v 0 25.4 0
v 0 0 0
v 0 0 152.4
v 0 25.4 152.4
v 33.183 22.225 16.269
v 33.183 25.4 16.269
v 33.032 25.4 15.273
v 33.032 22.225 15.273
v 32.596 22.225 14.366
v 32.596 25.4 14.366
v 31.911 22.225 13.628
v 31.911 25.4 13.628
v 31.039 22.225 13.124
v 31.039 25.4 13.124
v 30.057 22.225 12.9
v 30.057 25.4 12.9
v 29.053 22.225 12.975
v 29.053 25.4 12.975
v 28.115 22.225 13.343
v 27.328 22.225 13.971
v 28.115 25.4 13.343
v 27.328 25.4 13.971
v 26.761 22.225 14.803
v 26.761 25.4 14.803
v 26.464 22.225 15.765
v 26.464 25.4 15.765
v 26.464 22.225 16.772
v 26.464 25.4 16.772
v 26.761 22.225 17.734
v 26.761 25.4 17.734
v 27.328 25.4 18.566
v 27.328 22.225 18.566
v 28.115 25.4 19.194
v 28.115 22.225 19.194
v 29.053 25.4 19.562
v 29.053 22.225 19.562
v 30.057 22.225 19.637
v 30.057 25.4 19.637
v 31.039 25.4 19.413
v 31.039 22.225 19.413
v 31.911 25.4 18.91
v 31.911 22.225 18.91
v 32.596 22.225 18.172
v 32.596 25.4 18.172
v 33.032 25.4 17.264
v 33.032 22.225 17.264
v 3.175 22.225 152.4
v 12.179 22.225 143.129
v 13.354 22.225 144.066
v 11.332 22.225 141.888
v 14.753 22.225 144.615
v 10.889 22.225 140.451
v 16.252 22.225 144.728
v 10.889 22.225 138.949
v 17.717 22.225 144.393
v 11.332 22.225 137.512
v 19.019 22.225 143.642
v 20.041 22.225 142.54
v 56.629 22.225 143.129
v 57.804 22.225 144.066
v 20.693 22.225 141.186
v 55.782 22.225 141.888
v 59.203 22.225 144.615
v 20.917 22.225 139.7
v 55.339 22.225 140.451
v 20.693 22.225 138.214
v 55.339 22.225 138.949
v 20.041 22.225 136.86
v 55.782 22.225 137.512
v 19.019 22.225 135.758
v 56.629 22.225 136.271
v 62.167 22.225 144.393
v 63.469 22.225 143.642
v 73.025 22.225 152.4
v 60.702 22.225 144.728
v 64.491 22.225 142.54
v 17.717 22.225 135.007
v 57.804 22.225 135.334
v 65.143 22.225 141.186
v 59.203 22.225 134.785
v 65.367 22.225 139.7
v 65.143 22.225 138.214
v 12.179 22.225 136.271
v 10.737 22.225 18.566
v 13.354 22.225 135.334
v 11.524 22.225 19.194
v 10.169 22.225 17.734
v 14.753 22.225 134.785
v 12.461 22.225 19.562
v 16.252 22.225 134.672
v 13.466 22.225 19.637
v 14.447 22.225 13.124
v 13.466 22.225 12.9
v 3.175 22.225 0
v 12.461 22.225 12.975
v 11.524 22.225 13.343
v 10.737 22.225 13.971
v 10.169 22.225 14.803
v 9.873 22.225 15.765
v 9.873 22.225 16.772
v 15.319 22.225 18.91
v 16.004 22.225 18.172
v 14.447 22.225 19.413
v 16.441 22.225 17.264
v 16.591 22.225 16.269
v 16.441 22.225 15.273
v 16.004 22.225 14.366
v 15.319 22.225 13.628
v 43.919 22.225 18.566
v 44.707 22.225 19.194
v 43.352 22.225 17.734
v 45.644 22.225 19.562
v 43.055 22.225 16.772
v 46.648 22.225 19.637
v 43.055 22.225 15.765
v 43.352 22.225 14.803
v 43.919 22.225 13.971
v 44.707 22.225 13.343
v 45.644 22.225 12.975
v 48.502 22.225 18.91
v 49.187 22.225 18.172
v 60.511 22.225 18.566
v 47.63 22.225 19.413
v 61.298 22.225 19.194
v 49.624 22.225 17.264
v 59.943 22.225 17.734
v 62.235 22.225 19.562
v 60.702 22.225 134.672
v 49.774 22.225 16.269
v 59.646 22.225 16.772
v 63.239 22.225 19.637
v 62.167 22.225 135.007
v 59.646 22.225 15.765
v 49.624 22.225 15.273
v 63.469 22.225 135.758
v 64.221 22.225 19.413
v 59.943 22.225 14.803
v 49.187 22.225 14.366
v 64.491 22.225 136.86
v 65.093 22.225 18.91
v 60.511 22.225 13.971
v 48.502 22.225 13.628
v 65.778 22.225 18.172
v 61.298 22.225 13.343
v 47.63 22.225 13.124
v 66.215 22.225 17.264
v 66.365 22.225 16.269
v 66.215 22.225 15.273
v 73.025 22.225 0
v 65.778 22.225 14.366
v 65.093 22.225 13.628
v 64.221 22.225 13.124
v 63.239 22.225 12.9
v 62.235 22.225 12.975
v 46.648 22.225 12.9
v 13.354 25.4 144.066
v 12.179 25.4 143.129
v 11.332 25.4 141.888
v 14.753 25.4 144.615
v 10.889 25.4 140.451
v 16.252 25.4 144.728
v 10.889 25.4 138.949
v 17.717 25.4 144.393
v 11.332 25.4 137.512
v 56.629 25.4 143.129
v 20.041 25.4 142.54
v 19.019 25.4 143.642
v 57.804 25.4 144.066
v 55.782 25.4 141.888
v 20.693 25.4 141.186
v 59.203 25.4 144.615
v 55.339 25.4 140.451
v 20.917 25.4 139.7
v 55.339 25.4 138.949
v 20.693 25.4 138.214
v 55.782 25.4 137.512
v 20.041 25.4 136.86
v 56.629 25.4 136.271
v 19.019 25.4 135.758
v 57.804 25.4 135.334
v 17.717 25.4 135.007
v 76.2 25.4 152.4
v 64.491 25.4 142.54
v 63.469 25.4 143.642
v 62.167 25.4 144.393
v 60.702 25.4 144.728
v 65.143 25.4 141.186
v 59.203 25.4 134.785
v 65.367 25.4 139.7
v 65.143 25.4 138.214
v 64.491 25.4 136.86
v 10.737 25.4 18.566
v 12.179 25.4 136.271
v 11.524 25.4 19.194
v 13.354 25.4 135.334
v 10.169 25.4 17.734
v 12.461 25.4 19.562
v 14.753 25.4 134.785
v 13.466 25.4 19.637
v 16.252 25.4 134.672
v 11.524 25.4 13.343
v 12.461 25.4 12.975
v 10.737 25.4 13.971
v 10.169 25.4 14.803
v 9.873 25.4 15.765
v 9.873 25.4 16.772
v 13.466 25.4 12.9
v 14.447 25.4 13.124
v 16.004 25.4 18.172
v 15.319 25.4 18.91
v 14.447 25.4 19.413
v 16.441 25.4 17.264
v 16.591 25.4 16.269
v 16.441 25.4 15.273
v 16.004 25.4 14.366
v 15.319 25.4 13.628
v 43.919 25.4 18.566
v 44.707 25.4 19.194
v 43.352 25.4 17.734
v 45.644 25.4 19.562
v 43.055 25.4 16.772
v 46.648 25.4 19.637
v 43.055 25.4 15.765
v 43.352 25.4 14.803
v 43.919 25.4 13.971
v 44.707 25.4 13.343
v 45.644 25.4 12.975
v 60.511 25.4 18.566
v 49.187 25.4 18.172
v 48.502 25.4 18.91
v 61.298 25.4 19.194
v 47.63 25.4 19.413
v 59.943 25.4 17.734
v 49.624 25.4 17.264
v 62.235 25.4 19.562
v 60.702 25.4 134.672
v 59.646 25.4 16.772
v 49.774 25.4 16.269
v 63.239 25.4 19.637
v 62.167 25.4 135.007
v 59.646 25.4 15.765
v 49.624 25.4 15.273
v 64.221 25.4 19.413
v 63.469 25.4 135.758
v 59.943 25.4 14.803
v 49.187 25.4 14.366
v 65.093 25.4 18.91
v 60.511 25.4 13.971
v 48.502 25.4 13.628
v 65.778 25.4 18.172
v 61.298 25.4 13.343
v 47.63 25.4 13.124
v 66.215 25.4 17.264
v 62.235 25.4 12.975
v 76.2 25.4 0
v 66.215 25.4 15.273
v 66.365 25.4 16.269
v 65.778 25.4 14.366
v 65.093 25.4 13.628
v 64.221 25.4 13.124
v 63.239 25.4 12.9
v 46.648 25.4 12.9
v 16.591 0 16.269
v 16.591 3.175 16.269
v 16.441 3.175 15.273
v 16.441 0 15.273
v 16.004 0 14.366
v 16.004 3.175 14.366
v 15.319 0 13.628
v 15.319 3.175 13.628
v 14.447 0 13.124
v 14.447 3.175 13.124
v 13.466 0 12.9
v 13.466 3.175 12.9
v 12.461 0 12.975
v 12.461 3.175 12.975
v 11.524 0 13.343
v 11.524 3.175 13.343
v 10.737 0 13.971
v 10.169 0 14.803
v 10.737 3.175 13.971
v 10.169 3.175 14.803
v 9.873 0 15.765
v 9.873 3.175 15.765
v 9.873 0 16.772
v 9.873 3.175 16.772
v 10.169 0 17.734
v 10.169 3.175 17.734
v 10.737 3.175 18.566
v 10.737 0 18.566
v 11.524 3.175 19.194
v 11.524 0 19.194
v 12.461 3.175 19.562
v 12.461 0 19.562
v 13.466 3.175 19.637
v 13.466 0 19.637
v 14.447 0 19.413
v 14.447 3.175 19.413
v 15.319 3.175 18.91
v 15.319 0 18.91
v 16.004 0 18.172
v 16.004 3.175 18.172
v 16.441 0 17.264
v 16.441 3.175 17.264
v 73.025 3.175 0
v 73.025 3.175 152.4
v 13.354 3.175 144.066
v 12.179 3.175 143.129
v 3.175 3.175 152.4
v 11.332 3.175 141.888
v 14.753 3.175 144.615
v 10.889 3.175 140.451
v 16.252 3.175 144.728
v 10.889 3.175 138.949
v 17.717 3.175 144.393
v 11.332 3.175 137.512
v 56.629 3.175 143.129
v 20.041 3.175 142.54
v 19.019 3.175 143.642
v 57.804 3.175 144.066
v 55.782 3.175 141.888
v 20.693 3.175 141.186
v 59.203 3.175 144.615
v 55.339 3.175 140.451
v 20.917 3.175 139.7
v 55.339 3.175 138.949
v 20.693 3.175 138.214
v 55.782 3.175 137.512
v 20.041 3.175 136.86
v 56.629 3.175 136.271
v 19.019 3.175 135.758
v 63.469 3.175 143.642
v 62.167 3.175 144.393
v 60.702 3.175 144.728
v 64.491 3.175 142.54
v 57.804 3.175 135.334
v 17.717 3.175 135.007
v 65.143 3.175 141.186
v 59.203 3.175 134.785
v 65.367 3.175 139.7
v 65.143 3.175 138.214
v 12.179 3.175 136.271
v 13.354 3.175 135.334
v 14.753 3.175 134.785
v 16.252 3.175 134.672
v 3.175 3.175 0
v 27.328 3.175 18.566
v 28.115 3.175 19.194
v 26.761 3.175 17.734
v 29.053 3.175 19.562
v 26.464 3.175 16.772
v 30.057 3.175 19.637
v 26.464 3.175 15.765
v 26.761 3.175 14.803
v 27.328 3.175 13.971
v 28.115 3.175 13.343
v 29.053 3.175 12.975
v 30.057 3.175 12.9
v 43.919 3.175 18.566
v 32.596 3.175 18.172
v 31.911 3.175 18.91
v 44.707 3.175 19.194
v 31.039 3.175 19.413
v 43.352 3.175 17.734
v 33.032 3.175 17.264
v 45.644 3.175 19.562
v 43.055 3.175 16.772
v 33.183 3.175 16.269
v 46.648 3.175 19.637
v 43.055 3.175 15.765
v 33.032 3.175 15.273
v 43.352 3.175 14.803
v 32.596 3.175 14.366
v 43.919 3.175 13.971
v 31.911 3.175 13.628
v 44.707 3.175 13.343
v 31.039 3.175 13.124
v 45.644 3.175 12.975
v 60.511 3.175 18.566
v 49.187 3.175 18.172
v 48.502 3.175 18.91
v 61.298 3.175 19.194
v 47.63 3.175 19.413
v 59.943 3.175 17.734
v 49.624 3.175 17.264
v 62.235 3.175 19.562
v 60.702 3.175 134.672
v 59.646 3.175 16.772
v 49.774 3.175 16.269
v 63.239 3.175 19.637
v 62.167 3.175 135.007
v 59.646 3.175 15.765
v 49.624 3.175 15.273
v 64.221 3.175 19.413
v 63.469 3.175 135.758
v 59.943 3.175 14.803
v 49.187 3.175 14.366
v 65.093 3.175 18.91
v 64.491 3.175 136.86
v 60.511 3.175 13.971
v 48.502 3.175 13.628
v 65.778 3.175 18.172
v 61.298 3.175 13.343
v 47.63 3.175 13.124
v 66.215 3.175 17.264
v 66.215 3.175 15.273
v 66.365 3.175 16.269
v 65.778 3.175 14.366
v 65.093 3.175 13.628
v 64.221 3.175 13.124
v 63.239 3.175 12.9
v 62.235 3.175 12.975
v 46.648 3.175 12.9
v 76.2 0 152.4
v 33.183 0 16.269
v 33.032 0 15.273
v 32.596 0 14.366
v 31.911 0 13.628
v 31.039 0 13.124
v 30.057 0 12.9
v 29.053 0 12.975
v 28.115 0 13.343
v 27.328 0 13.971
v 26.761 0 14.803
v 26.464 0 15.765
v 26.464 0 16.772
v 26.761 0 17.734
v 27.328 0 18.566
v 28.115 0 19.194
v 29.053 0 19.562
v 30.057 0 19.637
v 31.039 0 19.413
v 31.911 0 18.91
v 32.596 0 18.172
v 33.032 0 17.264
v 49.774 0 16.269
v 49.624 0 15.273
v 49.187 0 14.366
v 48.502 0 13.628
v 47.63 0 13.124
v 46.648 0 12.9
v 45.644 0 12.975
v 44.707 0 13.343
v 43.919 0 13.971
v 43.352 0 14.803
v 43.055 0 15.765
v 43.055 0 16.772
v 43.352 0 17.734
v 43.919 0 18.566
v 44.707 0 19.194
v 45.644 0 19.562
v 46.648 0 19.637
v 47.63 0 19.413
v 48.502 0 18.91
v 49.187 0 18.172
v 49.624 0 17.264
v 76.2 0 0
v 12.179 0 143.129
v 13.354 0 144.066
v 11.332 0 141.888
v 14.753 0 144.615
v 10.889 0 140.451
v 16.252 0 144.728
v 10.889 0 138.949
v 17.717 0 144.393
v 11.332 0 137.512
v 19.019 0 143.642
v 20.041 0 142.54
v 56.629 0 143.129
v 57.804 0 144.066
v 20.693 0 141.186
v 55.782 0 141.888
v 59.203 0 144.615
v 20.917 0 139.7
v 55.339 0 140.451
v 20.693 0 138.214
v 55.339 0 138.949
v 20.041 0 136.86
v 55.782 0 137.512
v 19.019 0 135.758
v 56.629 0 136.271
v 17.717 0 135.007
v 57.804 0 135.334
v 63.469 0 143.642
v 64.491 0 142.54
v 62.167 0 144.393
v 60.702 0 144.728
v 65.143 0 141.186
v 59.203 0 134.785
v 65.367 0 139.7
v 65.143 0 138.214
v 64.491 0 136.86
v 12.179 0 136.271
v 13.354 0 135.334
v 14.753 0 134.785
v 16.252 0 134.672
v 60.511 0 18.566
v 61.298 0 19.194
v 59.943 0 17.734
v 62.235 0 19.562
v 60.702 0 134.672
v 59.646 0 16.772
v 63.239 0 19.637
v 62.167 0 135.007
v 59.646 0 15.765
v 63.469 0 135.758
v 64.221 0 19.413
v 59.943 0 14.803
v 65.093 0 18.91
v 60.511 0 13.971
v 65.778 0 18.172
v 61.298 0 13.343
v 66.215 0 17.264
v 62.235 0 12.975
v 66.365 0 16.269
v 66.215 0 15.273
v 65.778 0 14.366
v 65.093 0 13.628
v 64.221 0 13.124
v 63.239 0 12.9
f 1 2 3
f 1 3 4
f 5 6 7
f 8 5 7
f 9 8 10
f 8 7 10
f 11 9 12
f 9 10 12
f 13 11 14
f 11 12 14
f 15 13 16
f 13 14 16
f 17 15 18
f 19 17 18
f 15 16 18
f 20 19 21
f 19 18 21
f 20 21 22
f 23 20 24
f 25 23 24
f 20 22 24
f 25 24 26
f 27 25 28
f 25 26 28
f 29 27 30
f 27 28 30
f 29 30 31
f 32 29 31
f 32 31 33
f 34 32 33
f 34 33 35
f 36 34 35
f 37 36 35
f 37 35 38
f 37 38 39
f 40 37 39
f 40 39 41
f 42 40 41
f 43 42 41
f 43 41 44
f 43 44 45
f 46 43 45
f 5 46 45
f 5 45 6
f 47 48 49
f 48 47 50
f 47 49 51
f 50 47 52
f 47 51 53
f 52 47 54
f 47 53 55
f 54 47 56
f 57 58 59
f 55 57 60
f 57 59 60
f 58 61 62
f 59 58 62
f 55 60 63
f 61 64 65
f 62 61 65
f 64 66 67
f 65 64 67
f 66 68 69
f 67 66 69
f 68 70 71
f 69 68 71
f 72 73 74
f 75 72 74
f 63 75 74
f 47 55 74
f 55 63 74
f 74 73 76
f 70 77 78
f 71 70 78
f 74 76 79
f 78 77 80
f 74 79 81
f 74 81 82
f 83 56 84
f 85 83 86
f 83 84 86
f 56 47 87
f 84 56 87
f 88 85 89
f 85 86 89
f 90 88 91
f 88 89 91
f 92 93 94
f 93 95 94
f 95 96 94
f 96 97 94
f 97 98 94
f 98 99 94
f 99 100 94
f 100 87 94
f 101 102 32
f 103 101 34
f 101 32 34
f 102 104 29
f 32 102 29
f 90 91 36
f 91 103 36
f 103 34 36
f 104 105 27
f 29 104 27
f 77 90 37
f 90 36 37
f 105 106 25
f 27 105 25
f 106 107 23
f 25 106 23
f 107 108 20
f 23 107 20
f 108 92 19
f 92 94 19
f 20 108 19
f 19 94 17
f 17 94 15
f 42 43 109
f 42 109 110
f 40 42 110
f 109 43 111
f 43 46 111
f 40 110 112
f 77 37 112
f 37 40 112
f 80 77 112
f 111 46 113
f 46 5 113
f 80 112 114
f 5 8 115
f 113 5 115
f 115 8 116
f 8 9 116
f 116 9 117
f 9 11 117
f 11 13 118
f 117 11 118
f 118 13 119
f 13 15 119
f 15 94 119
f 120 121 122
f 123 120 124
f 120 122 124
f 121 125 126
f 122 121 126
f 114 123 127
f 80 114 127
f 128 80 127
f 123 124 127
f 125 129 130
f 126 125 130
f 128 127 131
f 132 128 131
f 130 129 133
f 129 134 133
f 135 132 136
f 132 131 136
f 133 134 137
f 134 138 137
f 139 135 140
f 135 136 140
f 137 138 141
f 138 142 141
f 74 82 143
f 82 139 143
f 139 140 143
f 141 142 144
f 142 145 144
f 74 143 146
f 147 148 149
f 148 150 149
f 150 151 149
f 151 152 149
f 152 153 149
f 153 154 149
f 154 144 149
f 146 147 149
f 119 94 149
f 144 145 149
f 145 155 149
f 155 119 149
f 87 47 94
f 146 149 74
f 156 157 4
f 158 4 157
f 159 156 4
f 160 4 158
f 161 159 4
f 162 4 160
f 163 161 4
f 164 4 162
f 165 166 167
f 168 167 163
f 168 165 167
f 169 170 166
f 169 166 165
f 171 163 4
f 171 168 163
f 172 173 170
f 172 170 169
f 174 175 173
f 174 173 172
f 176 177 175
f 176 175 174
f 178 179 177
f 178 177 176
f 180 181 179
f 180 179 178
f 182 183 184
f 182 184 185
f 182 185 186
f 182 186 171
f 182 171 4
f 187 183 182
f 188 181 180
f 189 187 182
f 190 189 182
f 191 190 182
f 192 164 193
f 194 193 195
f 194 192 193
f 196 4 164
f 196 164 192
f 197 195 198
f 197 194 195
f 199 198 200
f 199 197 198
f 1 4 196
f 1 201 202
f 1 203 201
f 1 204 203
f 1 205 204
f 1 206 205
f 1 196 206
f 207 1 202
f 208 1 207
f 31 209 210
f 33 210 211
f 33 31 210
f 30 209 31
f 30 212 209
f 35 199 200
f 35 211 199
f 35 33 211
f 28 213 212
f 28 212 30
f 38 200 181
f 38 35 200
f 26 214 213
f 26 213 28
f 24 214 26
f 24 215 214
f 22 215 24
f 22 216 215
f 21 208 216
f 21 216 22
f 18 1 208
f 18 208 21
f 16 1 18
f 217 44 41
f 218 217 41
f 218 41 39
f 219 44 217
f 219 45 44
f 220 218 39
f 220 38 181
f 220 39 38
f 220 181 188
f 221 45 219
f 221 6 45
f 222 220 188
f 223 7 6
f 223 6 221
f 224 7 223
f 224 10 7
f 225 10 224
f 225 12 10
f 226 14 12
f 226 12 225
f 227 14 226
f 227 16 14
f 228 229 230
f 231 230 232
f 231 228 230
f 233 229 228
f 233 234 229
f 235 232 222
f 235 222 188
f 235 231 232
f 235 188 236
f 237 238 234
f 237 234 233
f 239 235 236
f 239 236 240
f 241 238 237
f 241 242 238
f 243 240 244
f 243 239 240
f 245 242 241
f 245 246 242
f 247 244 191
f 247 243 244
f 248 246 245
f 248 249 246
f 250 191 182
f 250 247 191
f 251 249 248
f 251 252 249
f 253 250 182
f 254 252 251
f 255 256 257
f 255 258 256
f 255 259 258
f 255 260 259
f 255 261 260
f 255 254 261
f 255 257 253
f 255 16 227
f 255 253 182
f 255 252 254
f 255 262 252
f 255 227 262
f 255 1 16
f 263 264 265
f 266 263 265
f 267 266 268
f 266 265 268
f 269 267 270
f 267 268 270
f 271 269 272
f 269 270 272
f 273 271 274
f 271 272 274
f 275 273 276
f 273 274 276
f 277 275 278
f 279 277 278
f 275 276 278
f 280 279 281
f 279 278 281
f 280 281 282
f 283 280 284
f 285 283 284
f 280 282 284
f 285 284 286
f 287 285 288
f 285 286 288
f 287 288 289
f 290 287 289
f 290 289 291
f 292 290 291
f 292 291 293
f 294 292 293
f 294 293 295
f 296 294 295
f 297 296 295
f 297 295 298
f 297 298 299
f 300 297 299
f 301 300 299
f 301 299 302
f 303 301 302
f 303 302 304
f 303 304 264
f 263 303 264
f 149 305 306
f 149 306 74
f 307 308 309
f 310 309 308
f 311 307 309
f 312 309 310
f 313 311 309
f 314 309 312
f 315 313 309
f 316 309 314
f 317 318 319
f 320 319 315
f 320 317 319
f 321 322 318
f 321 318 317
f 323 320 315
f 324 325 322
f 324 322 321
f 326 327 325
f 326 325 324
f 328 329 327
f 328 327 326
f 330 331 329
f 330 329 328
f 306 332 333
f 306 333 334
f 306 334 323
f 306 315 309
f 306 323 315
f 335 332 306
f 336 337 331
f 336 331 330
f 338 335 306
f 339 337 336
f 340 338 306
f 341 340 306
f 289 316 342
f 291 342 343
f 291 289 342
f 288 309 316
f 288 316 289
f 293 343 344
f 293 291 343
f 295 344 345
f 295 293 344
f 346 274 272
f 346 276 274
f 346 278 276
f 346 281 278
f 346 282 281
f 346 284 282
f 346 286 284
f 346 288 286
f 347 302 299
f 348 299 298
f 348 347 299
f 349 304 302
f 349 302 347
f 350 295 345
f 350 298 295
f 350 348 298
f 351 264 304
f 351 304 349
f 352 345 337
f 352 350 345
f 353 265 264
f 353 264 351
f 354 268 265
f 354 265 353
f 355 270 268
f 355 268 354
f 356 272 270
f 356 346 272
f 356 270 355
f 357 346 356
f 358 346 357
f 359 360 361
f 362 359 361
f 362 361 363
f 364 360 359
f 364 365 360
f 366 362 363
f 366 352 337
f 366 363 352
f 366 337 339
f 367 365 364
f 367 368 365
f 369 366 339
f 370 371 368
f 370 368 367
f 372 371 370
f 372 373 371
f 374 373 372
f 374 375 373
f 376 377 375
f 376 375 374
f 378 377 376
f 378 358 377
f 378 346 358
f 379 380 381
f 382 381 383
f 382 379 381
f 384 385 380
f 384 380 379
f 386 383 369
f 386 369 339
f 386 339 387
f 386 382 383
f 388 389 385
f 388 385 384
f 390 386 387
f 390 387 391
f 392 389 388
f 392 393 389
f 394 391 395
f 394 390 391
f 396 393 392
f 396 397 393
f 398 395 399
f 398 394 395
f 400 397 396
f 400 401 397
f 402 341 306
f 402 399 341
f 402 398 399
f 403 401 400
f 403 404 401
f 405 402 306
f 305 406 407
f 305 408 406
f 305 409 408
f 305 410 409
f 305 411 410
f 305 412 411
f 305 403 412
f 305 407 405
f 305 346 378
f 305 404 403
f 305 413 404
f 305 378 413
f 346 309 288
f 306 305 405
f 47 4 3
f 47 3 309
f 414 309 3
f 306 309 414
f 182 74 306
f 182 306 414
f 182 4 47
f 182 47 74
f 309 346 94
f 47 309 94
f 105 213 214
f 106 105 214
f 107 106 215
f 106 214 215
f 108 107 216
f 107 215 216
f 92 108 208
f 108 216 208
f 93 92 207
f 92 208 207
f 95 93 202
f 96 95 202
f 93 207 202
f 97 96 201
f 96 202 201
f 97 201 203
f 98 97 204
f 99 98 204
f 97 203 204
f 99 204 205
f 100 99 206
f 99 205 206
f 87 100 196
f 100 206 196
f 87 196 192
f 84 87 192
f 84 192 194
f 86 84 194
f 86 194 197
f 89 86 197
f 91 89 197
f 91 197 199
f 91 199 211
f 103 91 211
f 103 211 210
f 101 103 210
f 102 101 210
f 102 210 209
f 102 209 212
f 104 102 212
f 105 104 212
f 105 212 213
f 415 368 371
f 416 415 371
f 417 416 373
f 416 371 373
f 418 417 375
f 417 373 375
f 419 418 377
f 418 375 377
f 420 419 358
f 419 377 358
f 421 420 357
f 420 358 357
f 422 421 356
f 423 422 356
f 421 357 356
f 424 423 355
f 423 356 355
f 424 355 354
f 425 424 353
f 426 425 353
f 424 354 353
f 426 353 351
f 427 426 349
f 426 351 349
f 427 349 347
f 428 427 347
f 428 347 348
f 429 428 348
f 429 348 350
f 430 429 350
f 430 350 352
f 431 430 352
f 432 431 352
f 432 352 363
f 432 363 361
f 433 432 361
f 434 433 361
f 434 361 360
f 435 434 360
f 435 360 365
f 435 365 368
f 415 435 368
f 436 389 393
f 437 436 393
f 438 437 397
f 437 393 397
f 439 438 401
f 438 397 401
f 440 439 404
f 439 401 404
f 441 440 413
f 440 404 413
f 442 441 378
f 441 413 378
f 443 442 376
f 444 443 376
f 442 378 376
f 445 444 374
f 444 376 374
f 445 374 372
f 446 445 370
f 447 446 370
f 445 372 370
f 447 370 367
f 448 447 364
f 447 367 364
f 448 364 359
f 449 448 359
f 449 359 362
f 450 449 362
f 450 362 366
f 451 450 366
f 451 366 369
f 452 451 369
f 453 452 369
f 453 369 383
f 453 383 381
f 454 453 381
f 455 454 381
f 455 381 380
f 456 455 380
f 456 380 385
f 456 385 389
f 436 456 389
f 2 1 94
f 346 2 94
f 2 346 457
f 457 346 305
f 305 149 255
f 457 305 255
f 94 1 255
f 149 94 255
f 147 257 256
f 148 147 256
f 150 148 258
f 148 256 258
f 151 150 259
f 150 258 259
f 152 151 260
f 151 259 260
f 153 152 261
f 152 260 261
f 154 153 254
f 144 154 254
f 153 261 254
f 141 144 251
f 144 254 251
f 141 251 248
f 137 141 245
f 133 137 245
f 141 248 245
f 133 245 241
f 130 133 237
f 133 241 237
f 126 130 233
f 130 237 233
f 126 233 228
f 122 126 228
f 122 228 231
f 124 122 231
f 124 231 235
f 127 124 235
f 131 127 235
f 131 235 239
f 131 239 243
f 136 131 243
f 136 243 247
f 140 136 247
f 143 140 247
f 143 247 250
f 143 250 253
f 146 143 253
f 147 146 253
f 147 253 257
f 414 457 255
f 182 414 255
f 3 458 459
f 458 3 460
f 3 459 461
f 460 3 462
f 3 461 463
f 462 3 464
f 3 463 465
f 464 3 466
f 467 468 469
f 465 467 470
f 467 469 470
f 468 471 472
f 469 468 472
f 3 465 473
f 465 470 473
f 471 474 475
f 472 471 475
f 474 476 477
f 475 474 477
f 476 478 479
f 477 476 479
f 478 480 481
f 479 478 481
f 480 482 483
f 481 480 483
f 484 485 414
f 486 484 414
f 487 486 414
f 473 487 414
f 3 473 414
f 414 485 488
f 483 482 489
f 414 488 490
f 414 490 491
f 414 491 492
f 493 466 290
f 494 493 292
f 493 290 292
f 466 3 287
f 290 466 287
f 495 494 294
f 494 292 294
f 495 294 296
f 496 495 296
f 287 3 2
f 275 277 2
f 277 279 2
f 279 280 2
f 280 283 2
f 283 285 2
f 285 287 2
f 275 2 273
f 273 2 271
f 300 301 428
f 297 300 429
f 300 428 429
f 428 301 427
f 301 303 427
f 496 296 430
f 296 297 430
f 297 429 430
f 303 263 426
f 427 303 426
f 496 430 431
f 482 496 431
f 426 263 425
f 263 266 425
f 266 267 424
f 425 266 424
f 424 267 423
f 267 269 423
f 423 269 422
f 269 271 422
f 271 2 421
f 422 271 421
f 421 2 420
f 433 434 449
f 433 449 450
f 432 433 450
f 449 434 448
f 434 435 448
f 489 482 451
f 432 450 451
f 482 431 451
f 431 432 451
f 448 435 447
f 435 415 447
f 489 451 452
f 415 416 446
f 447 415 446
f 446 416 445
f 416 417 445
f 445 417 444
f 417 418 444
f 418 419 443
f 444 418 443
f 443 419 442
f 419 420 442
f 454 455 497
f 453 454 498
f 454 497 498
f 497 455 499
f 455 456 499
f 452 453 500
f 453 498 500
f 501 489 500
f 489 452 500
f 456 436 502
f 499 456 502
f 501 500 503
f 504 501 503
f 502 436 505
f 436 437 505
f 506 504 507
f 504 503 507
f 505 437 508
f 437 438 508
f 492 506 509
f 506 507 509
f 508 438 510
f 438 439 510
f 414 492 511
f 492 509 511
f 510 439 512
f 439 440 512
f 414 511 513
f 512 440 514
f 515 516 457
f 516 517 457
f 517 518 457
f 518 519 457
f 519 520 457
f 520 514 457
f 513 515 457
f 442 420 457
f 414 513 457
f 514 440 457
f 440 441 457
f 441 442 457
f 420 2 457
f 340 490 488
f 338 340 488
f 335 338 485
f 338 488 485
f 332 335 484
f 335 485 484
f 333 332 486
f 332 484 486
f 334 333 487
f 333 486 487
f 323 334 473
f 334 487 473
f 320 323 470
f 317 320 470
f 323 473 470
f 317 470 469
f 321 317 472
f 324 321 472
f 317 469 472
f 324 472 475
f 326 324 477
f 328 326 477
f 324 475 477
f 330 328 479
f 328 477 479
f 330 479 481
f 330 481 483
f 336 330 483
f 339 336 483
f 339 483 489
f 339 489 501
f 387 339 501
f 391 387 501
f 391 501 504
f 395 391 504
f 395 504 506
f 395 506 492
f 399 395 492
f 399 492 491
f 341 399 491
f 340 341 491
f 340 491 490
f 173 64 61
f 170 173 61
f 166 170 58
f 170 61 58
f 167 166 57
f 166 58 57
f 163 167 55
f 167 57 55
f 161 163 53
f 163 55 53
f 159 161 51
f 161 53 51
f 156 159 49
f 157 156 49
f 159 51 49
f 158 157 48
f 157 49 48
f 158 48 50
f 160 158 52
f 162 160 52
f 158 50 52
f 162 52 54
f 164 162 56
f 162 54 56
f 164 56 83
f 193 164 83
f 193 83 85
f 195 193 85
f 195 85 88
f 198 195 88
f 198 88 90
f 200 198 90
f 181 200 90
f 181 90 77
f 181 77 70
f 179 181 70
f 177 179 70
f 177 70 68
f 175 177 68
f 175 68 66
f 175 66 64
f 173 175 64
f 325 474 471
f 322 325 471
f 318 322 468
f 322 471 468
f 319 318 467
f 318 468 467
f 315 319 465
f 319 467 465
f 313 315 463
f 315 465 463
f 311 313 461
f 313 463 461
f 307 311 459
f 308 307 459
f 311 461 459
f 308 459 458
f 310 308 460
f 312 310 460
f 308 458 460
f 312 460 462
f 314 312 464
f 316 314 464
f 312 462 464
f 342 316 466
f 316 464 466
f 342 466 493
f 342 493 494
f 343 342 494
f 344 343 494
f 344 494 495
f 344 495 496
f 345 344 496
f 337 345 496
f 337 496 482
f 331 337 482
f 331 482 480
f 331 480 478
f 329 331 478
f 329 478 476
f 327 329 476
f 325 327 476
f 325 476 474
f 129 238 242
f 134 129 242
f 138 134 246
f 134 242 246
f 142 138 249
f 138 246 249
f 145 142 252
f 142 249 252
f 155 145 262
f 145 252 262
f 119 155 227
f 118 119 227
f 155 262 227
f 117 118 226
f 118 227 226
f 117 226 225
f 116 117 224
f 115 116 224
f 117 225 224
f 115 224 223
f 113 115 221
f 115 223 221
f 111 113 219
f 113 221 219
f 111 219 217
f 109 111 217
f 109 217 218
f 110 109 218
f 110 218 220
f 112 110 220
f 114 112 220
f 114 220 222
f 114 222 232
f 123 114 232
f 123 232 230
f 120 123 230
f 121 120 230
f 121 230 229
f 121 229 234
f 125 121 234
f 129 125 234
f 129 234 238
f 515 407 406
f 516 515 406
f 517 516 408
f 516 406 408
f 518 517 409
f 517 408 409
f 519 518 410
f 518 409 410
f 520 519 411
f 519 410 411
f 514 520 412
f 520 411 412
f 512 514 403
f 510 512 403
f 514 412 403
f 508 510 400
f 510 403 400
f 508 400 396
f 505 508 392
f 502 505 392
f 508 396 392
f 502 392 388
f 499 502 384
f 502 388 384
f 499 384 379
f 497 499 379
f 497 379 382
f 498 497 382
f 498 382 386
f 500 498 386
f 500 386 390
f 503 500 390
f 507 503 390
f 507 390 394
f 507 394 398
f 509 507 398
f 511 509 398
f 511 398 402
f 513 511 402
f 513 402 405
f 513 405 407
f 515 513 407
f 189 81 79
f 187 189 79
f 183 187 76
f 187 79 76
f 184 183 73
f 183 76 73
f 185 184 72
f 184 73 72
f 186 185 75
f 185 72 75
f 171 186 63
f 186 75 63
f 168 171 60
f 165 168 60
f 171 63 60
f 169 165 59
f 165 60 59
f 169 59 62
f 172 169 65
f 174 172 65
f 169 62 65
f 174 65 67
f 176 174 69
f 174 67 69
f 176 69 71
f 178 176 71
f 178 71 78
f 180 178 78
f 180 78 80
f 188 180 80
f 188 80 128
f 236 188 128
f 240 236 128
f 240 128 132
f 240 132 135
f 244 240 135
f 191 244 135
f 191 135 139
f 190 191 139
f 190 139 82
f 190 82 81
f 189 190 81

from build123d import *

# Parameters (mm, degrees)
SKETCH1_W           = 76.2
SKETCH1_H           = 25.4
SKETCH1_W_2         = 69.85
SKETCH1_H_2         = 19.05
BOSS_EXTRUDE1_DEPTH = 152.4
SKETCH2_R           = 3.3782
CUT_EXTRUDE1_DEPTH  = 26.4
SKETCH3_R           = 5.0419
CUT_EXTRUDE2_DEPTH  = 26.4


with BuildPart() as part:
    # Sketch1 → Boss-Extrude1 (new body)
    with BuildSketch(Plane.XY):
        with Locations((38.1, 12.7)):
            Rectangle(SKETCH1_W, SKETCH1_H)
        with Locations((38.1, 12.7)):
            Rectangle(SKETCH1_W_2, SKETCH1_H_2, mode=Mode.SUBTRACT)
    extrude(amount=BOSS_EXTRUDE1_DEPTH)

    # Sketch2 → Cut-Extrude1 (cut, through all)
    with BuildSketch(Plane(origin=(0, 25.4, 0), x_dir=(1, 0, 0), z_dir=(0, 1, 0))):
        with Locations((13.21308, -16.2687)):
            Circle(SKETCH2_R)
        with Locations((29.80436, -16.2687)):
            Circle(SKETCH2_R)
        with Locations((46.39564, -16.2687)):
            Circle(SKETCH2_R)
        with Locations((62.98692, -16.2687)):
            Circle(SKETCH2_R)
    extrude(amount=-CUT_EXTRUDE1_DEPTH, mode=Mode.SUBTRACT)

    # Sketch3 → Cut-Extrude2 (cut, through all)
    with BuildSketch(Plane.XZ):
        with Locations((60.325, 139.7)):
            Circle(SKETCH3_R)
        with Locations((15.875, 139.7)):
            Circle(SKETCH3_R)
    extrude(amount=-CUT_EXTRUDE2_DEPTH, mode=Mode.SUBTRACT)


solid = part.part
